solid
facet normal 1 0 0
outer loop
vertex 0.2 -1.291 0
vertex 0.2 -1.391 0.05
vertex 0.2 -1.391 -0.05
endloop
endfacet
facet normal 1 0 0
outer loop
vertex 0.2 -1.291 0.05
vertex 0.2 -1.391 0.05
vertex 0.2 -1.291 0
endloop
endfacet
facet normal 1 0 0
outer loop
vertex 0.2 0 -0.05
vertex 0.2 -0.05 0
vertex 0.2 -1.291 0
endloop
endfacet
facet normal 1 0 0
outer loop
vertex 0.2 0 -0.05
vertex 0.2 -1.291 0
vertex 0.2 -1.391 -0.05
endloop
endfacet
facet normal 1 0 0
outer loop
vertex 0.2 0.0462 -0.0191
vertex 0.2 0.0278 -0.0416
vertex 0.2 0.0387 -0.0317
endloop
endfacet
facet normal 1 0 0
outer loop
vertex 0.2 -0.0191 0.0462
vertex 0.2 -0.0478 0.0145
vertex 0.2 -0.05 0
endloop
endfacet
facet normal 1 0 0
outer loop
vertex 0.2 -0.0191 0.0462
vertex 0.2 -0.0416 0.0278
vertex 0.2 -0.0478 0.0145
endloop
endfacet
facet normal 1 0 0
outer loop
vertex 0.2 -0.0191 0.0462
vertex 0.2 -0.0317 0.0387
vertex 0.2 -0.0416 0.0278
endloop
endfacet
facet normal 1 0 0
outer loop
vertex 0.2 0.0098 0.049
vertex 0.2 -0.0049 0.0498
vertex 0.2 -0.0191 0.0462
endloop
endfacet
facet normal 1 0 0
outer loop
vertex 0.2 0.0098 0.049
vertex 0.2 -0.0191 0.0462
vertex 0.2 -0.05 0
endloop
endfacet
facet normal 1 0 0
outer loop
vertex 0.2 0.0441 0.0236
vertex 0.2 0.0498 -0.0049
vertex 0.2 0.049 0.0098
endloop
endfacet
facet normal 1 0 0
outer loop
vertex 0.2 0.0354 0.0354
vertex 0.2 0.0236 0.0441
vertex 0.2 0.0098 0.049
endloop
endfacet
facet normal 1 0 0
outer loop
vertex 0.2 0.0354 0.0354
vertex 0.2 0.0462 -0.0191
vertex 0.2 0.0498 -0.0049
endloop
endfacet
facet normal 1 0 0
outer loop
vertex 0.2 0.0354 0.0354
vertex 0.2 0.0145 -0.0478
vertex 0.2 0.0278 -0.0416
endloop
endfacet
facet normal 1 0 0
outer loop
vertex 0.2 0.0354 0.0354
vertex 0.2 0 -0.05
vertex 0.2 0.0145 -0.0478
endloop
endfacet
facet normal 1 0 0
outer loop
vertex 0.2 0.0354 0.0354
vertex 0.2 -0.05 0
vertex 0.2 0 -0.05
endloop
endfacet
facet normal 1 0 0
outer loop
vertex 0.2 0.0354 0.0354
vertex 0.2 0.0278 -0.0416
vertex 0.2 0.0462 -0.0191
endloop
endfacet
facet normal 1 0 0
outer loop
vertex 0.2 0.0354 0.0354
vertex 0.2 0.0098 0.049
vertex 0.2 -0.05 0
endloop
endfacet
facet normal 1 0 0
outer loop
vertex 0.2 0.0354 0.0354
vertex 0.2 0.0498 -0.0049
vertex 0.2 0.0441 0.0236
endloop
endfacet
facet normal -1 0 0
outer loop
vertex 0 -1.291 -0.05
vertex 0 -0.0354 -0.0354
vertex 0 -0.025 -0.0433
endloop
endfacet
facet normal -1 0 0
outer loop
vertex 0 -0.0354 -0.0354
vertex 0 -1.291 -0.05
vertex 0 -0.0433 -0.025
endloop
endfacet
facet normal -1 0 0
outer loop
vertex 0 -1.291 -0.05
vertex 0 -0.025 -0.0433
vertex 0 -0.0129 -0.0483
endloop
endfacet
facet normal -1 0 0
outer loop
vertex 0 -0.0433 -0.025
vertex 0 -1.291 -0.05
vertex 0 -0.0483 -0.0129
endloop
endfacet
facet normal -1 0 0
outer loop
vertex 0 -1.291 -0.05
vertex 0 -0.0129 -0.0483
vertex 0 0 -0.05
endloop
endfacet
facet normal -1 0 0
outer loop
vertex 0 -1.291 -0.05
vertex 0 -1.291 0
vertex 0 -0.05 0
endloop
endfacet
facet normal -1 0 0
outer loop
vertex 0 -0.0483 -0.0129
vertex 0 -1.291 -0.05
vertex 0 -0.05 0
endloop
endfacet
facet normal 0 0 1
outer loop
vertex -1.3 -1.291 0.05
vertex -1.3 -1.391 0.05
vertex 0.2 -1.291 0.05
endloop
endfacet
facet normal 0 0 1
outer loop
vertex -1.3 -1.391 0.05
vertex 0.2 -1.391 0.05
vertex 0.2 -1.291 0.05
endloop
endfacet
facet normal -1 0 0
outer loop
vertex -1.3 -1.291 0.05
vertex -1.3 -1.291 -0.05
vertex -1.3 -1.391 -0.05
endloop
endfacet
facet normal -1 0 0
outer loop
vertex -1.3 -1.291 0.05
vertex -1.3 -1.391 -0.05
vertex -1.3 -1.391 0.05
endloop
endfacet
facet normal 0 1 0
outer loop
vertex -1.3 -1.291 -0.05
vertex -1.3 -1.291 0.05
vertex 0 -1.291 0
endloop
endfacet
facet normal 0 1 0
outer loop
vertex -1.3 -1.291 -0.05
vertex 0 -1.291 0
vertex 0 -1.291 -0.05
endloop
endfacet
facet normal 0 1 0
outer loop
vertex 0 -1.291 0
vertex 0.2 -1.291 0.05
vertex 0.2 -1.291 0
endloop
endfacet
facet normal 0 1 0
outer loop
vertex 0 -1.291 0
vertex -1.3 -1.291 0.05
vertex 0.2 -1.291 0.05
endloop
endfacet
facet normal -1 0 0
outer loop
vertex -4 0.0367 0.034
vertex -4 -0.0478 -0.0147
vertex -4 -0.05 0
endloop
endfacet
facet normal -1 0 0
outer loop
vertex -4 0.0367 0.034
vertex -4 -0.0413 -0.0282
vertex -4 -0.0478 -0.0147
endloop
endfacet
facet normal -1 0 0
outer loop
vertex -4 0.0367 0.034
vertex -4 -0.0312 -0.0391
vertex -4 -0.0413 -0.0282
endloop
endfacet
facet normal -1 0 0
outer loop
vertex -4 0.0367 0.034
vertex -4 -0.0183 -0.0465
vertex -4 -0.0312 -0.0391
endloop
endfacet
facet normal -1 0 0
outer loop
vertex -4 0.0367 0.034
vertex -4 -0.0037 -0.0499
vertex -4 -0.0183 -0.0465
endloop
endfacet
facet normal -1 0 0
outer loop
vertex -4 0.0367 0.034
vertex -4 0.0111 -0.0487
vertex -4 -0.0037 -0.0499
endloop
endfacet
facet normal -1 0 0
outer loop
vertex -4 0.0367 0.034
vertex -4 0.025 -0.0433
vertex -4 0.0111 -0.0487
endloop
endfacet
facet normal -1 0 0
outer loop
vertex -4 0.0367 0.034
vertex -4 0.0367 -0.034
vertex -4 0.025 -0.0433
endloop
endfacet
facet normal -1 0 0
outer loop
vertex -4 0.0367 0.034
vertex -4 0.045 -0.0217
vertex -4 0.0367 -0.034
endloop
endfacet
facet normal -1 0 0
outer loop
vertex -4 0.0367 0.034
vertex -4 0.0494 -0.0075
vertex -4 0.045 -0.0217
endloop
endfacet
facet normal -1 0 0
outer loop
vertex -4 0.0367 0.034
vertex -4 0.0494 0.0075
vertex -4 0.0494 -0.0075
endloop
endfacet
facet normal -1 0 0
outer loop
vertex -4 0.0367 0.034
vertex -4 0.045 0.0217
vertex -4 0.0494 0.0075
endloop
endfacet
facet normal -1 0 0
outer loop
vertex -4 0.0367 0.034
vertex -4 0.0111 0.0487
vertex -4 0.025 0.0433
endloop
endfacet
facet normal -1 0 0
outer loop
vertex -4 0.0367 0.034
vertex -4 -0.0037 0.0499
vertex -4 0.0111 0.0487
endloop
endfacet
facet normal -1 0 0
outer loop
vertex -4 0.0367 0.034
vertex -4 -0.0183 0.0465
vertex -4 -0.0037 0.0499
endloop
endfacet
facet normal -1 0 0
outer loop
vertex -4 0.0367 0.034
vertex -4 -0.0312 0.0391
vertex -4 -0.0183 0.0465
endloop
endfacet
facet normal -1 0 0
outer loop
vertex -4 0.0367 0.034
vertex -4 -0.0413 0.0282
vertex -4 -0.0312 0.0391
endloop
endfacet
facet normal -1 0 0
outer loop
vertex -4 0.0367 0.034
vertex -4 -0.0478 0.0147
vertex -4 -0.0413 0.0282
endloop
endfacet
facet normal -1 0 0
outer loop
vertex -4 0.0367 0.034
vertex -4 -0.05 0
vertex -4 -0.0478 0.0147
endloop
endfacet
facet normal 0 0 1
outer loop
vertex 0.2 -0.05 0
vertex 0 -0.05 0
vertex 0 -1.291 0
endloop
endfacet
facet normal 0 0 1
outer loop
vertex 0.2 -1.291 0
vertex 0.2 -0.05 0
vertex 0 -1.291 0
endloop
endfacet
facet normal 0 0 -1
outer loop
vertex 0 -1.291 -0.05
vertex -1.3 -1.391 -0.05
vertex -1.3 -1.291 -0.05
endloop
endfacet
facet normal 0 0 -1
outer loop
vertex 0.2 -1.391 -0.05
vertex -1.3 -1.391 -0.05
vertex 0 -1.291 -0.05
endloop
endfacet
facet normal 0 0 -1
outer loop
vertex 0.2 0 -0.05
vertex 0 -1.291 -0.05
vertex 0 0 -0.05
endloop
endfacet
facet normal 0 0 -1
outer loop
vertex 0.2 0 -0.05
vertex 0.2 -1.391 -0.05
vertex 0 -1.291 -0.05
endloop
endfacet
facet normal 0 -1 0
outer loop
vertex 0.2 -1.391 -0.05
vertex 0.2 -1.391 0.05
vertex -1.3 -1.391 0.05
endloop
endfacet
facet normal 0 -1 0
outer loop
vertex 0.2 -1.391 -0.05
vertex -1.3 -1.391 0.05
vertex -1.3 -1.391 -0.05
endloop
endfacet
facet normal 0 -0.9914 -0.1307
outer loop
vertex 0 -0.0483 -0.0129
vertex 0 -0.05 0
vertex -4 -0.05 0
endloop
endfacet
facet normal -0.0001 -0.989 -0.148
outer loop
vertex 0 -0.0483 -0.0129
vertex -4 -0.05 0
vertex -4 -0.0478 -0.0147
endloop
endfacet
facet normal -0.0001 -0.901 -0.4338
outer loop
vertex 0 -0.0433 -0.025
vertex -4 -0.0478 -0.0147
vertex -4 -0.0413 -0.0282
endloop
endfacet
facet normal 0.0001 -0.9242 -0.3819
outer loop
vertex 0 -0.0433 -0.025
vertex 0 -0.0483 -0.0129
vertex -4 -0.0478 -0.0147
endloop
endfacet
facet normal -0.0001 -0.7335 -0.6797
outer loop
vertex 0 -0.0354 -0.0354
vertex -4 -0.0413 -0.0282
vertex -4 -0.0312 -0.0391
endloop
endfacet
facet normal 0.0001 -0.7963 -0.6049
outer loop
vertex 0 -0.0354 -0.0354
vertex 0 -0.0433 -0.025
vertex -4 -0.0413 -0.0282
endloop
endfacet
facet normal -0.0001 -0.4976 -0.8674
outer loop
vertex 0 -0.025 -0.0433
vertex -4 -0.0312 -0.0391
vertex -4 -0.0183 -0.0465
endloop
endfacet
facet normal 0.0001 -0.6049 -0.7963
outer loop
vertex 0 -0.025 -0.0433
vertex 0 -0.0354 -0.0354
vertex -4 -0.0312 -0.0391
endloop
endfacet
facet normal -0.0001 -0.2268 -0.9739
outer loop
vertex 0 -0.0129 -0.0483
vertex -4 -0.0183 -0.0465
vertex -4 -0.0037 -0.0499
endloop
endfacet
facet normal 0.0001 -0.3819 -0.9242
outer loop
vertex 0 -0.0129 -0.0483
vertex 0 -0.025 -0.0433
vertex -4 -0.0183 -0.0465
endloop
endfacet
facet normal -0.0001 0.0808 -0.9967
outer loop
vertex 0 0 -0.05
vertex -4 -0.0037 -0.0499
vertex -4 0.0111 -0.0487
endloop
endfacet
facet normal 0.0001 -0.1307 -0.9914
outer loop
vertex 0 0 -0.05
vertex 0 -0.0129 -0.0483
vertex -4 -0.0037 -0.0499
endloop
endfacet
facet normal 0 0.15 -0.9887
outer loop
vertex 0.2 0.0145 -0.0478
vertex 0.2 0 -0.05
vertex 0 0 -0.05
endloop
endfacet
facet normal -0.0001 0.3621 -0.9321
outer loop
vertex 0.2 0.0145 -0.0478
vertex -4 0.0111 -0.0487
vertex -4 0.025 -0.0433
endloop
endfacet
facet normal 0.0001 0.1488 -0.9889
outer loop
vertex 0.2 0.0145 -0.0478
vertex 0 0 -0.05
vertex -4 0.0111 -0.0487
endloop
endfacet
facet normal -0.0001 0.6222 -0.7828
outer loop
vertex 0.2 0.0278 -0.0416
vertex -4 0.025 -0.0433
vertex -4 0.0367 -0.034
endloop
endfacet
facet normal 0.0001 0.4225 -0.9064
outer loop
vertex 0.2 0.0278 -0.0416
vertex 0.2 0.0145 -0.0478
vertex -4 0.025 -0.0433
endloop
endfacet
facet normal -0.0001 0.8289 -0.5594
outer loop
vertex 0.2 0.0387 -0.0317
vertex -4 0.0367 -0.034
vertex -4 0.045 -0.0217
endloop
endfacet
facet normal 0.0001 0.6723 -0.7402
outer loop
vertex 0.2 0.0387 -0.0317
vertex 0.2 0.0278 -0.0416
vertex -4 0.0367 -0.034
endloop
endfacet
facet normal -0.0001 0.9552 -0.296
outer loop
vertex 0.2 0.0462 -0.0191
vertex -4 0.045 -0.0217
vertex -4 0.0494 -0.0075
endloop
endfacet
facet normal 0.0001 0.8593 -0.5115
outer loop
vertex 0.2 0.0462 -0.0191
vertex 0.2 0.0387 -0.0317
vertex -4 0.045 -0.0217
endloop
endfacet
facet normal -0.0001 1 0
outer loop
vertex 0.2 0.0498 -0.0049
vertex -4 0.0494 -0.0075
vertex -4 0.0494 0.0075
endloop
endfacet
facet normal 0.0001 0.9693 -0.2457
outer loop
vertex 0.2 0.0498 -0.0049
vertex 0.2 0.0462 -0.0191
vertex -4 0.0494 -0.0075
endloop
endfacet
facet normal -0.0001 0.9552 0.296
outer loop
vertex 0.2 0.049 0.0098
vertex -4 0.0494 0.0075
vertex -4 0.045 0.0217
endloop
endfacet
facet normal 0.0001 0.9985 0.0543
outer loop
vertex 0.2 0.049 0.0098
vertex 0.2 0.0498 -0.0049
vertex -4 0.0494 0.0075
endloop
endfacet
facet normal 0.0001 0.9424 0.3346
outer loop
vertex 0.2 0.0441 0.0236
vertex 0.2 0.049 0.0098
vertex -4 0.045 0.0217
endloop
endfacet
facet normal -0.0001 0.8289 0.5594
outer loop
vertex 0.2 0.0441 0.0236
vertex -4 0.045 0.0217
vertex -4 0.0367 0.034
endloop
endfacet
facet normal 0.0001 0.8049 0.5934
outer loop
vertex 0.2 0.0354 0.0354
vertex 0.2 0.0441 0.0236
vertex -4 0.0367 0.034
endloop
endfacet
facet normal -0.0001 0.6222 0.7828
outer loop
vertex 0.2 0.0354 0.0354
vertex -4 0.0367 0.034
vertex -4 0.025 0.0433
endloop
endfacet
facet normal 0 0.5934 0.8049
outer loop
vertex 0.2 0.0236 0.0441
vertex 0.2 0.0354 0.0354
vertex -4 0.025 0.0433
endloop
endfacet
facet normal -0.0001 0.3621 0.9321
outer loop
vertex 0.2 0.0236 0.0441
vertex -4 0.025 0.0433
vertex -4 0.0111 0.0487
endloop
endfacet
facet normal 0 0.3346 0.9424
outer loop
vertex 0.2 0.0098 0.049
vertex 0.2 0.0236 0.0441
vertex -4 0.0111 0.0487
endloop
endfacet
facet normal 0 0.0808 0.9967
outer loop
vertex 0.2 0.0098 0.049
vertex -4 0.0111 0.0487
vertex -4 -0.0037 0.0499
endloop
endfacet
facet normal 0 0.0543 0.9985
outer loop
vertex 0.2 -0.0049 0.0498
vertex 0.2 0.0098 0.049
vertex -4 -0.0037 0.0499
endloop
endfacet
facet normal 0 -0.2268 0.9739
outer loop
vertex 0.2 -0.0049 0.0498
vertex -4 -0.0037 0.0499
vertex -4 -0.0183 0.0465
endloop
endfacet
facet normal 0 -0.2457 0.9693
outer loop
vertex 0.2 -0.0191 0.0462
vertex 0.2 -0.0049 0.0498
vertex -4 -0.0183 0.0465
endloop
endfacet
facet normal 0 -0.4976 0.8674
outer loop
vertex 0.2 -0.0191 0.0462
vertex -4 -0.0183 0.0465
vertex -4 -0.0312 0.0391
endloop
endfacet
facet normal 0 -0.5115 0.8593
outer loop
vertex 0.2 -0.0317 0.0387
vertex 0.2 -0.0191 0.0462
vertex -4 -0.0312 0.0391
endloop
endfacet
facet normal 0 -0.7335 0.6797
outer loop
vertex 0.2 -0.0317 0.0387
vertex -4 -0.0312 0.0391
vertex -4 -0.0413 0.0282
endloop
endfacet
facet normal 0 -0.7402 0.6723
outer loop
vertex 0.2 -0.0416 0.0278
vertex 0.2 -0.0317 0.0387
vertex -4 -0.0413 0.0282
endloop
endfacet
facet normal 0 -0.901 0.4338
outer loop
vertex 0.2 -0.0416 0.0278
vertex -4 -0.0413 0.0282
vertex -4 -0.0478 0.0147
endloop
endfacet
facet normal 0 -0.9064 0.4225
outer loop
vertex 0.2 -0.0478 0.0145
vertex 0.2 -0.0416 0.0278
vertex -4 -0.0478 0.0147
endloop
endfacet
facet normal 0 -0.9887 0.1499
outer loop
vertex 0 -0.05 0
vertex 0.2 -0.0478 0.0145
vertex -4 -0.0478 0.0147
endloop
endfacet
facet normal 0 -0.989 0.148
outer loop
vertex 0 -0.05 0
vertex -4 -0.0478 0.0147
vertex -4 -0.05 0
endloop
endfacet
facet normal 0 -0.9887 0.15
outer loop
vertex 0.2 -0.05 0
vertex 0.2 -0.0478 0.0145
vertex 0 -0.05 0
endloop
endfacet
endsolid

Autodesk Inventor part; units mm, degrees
ref_plane "YZ Plane" through (0, 0, 0) normal (1, 0, 0) x (0, 1, 0)
ref_plane "XZ Plane" through (0, 0, 0) normal (0, 1, 0) x (-1, 0, 0)
ref_plane "XY Plane" through (0, 0, 0) normal (0, 0, 1) x (1, 0, 0)
sketch "Sketch1" plane through (0, 0, 0) normal (1, 0, 0) x (0, 1, 0)
  circle A0 centre (0, 0) radius 0.05
  line L0 (0, 0) -> (-1.341, 0)
  line L1 (-1.391, 0.05) -> (-1.291, 0.05)
  line L2 (-1.291, 0.05) -> (-1.291, -0.05)
  line L3 (-1.291, -0.05) -> (-1.391, -0.05)
  line L4 (-1.391, -0.05) -> (-1.391, 0.05)
  line L5 (-1.391, 0.05) -> (-1.291, -0.05) construction
  line L6 (-1.291, 0.05) -> (-1.391, -0.05) construction
  line L7 (-1.291, -0.05) -> (0, -0.05)
  point P0 (-0.05, 0)
  point P1 (-1.291, 0)
  dimension "d0" = 0.1
  dimension "d1" = 1.341
  dimension "d2" = 0.1
  dimension "d3" = 0.1
extrude "Extrusion1" add sketch "Sketch1" along normal blind 0.2
sketch "Sketch2" plane through (0, 0, 0) normal (-1, 0, 0) x (0, 0, 1)
  arc A0 (0, -0.05) -> (-0.05, 0) centre (0, 0) ccw projected
  circle A1 centre (0, 0) radius 0.05
  point P0 (-0.05, 0)
  point P1 (0, -0.05)
  dimension "d6" = 0.1
extrude "Extrusion2" add sketch "Sketch2" along normal blind 4
sketch "Sketch3" plane through (0, 0, 0) normal (-1, 0, 0) x (0, 0, 1)
  line L0 (-0.05, -1.391) -> (-0.05, 0) projected
  line L1 (0.05, -1.391) -> (-0.05, -1.391) projected
  line L2 (-0.05, -1.391) -> (0.05, -1.391)
  line L3 (0, -1.291) -> (0.05, -1.291) projected
  line L4 (0.05, -1.391) -> (0.05, -1.291)
  line L5 (0.05, -1.291) -> (-0.05, -1.291)
  line L6 (-0.05, -1.291) -> (-0.05, -1.391)
  point P0 (0, 0)
extrude "Extrusion3" add sketch "Sketch3" along normal blind 1.3
properties part number "Bone18_17_Fix"
